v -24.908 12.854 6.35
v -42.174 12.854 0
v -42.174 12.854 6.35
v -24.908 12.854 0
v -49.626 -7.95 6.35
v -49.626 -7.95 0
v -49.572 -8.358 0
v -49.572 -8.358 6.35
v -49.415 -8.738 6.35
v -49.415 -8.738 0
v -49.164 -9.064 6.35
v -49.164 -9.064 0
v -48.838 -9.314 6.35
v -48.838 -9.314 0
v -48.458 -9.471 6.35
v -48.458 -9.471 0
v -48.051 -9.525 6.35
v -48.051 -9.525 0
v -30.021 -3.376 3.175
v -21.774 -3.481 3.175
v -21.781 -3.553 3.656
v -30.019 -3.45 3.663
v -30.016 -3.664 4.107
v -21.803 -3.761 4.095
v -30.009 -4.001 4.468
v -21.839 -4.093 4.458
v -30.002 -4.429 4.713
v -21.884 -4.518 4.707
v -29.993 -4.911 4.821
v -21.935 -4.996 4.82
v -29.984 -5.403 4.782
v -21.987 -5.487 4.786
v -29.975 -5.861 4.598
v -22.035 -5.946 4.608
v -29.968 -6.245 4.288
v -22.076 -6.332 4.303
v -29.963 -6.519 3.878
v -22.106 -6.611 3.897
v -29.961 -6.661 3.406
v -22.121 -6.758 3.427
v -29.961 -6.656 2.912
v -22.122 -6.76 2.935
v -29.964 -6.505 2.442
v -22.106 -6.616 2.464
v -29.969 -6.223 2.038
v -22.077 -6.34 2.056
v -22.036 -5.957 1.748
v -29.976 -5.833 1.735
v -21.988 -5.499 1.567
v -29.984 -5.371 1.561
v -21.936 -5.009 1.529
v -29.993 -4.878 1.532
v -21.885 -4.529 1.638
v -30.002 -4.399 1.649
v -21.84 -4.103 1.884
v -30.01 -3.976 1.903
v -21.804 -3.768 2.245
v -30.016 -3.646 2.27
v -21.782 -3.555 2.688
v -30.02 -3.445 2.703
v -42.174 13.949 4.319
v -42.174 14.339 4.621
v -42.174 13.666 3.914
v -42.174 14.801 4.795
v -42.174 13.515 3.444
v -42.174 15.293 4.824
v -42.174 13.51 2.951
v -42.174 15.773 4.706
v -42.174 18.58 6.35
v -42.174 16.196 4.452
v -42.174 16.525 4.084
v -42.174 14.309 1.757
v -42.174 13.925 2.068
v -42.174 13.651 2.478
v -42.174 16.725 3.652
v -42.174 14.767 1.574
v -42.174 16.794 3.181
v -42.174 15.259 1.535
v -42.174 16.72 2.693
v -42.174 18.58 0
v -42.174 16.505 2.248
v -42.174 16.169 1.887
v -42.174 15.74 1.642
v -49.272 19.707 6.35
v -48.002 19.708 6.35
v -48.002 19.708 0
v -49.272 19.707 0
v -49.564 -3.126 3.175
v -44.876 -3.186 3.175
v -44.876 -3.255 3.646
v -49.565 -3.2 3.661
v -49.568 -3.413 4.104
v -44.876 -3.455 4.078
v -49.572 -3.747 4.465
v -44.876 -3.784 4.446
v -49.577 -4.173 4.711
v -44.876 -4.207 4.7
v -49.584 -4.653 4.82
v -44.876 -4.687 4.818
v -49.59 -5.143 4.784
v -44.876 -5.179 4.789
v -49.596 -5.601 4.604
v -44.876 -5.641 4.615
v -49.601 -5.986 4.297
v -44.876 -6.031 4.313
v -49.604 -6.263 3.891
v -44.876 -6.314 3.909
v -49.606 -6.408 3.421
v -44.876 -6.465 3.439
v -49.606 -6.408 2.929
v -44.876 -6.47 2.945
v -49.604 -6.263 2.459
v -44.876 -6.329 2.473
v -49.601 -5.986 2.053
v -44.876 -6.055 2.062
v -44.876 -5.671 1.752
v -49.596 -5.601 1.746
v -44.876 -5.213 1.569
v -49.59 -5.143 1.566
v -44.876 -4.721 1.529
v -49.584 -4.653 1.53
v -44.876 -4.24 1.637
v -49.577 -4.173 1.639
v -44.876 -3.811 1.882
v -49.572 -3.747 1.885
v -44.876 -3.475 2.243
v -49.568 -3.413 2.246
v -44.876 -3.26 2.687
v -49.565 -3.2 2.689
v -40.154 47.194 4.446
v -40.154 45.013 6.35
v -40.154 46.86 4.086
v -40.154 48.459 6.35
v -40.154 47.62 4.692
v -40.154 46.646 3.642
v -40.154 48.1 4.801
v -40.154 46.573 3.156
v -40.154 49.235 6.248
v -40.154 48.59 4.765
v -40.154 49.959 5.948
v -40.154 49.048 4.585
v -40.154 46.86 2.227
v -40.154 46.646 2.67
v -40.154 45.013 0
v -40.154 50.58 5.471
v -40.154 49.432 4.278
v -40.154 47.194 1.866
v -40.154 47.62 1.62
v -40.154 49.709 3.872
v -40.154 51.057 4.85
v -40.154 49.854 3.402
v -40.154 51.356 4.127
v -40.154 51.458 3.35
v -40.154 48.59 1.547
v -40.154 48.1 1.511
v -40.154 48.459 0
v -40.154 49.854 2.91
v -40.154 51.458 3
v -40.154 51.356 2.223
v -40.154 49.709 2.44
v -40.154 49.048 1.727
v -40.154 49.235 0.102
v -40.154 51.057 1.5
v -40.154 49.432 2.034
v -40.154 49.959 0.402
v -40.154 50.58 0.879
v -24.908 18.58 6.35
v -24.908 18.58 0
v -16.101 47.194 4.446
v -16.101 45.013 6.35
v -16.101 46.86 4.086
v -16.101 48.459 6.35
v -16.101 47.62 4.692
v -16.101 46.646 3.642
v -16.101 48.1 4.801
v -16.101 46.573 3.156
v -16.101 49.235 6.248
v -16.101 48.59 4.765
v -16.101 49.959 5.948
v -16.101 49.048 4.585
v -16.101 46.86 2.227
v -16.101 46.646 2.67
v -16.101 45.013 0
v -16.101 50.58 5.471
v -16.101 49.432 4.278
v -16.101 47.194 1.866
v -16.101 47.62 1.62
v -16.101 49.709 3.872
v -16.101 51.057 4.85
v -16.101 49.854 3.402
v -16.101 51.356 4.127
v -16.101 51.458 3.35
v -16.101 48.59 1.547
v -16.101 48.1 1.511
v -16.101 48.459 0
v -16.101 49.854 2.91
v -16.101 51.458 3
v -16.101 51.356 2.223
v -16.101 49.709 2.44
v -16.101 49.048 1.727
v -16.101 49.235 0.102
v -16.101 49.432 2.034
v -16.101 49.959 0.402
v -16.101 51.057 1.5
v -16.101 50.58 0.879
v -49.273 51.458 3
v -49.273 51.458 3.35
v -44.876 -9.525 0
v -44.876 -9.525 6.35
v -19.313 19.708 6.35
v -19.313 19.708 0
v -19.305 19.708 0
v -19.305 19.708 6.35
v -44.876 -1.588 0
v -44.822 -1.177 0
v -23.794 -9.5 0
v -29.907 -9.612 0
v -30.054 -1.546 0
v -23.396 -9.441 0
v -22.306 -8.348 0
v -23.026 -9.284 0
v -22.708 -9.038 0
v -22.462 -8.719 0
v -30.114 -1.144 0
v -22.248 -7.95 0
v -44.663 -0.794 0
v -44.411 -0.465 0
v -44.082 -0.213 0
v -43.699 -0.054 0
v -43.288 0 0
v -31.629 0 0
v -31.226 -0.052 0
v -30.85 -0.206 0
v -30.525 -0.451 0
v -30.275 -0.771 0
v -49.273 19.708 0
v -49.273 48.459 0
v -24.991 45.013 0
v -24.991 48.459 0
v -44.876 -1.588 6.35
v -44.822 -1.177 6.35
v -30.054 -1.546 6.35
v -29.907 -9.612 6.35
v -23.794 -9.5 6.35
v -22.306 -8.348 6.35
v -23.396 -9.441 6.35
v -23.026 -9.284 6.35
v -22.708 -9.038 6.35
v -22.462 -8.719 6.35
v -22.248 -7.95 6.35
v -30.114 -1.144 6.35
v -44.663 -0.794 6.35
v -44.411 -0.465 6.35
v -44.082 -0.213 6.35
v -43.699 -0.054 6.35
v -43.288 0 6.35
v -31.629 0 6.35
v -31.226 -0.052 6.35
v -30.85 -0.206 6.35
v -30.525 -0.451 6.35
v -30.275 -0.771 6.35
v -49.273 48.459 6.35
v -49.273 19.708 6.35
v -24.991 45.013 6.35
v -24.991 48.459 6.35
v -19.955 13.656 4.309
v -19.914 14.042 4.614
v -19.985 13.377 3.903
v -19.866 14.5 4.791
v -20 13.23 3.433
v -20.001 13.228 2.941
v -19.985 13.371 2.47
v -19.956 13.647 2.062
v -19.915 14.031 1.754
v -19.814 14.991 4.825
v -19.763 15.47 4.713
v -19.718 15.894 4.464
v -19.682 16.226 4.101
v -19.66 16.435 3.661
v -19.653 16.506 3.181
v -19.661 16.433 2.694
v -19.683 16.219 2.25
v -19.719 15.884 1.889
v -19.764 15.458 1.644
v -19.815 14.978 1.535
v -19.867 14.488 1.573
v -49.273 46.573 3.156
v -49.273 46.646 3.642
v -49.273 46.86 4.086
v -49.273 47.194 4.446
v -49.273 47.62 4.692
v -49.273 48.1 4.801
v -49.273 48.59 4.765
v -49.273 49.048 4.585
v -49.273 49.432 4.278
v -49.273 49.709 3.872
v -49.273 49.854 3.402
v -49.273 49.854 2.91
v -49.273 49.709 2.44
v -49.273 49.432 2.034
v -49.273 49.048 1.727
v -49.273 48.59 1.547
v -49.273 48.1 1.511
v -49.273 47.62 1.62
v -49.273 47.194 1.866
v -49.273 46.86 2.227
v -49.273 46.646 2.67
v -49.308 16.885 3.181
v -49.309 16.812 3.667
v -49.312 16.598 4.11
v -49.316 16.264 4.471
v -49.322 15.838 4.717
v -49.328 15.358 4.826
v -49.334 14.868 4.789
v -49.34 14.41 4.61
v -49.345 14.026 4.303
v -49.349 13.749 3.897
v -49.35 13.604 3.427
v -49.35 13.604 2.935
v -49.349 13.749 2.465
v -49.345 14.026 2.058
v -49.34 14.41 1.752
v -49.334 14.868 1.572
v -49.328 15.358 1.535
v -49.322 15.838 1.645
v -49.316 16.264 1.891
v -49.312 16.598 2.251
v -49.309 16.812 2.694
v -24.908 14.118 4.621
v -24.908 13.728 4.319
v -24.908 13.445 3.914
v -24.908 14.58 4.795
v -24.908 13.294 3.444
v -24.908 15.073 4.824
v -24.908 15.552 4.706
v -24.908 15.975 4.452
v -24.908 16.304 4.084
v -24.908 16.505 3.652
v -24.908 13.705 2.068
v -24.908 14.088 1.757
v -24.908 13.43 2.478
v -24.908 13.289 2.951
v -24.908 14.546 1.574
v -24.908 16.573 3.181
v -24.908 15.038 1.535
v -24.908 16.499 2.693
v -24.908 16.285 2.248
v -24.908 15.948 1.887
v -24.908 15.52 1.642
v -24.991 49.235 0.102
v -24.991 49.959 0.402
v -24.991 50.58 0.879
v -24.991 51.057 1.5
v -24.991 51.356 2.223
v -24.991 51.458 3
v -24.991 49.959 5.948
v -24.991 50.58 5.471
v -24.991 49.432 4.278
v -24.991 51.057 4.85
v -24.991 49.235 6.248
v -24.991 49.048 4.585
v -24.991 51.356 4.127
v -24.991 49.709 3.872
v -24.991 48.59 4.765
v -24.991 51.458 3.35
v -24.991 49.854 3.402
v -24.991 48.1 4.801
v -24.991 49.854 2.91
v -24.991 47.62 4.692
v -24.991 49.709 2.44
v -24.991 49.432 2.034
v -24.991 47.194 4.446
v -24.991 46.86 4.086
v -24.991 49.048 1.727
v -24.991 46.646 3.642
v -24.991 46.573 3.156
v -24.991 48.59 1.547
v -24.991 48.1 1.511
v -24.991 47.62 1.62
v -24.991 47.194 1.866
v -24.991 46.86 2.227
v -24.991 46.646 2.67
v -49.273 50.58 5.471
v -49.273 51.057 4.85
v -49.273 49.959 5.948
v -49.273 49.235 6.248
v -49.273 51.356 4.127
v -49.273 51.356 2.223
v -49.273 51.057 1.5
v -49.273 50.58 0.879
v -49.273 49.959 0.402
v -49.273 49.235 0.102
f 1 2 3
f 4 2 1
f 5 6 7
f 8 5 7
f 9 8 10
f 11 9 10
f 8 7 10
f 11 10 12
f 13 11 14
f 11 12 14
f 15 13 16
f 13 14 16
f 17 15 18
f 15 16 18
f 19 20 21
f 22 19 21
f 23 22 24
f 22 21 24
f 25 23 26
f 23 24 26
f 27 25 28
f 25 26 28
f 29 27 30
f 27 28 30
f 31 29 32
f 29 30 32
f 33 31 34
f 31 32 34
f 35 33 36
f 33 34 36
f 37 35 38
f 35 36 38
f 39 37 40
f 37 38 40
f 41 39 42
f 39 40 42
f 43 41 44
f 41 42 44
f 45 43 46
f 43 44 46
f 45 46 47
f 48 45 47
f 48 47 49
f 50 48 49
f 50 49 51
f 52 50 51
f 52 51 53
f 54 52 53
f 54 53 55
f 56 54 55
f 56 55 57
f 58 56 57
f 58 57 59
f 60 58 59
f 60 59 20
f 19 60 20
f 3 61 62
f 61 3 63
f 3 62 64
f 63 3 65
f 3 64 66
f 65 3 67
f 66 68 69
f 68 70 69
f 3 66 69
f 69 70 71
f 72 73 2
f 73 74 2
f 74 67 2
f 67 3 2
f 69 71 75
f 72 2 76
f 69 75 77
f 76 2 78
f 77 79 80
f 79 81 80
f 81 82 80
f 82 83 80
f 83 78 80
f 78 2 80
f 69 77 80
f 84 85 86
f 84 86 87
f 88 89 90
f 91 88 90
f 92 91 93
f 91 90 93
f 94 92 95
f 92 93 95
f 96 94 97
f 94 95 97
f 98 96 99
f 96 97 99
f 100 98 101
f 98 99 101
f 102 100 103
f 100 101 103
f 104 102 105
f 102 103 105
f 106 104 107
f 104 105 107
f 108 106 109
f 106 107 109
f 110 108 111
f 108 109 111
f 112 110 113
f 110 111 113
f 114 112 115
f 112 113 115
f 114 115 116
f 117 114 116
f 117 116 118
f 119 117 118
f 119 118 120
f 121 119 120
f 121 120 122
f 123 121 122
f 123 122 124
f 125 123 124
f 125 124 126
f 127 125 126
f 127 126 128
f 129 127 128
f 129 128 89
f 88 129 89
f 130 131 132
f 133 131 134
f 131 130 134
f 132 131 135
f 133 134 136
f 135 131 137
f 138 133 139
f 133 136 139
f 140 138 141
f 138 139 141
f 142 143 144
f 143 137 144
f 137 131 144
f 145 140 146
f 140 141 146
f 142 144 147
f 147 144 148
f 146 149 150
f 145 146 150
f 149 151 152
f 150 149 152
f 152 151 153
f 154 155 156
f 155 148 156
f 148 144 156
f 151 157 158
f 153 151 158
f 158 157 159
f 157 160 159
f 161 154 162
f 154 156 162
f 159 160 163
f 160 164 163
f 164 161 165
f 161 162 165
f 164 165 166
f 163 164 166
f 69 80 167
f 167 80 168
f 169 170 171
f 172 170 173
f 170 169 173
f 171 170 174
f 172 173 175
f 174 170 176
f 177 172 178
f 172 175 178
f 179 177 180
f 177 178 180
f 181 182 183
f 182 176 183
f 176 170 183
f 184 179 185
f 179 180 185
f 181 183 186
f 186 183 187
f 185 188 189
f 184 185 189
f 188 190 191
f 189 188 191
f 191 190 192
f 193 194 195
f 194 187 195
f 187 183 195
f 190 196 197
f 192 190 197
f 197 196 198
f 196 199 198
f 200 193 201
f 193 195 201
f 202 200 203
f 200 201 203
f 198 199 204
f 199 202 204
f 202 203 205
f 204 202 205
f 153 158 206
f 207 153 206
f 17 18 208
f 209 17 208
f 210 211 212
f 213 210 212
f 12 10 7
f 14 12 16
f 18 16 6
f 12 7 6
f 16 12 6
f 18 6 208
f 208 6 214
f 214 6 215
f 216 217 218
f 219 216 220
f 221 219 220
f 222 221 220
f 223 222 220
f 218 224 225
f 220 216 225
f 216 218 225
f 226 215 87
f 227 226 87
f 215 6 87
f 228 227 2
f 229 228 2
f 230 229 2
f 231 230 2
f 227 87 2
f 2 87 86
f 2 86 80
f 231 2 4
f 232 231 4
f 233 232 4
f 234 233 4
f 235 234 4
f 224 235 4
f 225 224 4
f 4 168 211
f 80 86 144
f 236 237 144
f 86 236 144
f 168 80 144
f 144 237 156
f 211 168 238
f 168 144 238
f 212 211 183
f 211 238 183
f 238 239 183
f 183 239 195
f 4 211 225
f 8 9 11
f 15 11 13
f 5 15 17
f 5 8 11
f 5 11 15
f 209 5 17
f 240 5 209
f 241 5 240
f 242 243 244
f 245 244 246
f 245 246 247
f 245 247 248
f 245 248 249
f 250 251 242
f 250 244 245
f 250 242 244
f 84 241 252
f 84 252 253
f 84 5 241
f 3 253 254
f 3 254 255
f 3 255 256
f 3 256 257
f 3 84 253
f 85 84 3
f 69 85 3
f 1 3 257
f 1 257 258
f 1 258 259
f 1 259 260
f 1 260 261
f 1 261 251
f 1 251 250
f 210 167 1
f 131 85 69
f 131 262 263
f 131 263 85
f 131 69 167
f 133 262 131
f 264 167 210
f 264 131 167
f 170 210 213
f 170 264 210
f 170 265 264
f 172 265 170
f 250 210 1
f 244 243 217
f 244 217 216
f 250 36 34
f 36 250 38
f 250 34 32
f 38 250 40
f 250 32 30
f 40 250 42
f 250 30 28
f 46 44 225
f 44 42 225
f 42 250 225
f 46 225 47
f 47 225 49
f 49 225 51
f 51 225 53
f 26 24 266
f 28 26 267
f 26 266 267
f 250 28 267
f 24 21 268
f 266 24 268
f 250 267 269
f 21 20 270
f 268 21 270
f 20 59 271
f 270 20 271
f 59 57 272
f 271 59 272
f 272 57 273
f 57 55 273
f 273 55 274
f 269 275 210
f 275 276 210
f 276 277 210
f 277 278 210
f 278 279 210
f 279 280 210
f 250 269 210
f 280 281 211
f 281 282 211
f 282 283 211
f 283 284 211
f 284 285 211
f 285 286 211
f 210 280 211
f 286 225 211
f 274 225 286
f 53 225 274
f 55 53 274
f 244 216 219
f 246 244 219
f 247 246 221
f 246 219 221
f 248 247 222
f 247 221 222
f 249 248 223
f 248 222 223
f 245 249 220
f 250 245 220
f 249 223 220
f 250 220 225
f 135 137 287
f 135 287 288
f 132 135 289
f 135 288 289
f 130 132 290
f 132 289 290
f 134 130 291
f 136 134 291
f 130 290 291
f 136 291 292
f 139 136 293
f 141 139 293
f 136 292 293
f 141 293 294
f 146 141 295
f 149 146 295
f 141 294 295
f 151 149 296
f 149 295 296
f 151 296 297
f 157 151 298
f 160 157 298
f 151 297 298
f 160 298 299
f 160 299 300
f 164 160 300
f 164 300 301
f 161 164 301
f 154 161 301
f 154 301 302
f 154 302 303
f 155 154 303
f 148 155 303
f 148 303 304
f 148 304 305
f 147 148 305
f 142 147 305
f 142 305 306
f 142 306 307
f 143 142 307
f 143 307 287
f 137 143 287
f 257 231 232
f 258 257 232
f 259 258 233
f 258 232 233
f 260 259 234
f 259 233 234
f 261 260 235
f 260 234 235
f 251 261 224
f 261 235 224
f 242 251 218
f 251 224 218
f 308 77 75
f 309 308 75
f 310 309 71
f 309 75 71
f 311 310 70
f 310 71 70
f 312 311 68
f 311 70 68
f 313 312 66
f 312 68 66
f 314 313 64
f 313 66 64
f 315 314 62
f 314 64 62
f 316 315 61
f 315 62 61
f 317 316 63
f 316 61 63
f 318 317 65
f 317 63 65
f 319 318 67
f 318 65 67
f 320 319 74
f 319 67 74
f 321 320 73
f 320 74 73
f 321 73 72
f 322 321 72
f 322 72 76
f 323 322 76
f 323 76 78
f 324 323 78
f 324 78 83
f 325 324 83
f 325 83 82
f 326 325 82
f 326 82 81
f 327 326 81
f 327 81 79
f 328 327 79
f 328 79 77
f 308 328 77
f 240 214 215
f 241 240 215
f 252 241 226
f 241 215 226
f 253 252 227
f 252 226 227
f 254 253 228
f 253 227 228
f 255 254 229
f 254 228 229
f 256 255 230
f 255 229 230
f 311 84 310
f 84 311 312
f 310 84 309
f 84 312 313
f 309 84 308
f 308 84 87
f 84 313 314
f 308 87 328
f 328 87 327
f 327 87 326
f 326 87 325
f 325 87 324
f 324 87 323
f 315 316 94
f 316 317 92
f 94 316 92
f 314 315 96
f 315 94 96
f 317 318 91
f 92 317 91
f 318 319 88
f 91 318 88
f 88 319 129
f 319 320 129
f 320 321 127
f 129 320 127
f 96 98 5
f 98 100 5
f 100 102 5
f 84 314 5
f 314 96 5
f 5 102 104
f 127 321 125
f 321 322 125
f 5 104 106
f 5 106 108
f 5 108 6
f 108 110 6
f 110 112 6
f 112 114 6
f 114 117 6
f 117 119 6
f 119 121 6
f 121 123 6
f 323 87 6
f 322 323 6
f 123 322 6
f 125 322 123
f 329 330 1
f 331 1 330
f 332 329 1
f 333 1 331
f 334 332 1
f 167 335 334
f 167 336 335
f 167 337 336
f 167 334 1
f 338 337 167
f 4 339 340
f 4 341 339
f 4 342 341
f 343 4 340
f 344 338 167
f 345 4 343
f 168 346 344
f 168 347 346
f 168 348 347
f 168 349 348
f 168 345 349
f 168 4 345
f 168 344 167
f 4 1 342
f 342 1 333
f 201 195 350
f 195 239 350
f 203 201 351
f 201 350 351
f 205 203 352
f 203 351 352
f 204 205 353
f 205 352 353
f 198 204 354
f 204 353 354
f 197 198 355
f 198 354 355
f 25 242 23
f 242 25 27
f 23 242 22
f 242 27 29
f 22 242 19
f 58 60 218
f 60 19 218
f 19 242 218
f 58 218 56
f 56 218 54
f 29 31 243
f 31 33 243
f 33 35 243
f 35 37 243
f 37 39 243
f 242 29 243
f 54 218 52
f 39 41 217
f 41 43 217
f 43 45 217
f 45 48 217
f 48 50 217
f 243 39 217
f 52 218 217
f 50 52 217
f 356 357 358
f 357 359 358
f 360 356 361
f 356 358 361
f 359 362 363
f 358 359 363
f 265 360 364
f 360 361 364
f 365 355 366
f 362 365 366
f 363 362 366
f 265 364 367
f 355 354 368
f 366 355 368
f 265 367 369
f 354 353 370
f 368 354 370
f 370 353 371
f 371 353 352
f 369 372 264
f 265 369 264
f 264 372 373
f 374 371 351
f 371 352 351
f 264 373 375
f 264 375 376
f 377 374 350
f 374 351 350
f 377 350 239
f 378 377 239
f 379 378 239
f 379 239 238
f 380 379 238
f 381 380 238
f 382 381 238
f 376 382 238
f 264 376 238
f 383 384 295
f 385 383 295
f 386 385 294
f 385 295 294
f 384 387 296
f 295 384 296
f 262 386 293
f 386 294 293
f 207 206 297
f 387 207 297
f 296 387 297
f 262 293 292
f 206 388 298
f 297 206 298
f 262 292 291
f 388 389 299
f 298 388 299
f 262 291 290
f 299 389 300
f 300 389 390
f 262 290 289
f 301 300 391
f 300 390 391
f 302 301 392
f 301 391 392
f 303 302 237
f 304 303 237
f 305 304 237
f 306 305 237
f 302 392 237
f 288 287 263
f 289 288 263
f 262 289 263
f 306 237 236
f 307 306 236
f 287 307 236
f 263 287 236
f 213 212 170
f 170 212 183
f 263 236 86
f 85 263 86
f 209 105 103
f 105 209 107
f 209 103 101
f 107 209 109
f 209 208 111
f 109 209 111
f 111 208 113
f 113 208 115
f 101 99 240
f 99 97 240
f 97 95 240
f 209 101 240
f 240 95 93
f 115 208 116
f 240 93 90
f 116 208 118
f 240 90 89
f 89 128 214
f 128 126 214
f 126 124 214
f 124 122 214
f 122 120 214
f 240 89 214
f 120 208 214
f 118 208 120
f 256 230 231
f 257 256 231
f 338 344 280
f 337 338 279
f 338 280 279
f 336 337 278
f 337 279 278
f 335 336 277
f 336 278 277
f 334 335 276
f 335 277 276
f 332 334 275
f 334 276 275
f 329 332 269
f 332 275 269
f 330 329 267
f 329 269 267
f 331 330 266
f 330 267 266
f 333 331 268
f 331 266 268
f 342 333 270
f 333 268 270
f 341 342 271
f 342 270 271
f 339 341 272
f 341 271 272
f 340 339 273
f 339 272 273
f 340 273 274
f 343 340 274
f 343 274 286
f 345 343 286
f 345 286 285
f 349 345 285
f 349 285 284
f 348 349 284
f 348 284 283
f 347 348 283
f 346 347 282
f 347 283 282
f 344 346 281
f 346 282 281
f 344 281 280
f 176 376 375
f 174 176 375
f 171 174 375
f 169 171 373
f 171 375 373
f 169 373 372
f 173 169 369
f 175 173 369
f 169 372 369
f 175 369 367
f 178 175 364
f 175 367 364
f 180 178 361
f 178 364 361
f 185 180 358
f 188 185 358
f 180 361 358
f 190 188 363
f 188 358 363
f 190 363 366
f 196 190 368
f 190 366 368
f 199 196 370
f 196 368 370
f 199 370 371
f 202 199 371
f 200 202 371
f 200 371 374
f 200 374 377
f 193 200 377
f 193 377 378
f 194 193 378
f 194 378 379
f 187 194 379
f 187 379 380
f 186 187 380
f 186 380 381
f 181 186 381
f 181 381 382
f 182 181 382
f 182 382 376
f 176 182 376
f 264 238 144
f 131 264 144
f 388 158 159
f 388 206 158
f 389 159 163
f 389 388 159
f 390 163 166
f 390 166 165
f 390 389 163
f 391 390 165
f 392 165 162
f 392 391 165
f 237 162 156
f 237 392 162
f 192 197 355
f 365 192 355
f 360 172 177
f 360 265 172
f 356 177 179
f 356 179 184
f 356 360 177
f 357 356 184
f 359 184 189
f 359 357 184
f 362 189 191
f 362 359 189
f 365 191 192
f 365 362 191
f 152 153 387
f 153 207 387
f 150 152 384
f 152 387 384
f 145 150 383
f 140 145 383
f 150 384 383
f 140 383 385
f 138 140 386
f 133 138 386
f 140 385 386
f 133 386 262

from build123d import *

# Parameters (mm, degrees)
F1_DEPTH = 6.35
F3_D     = 3.3
F4_R     = 2.99974
F5_W     = 17.2659438103
F5_H     = 5.7261204347
F6_DEPTH = 6.35
F8_D     = 3.3
F10_D    = 3.3


with BuildPart() as f1:
    # F0 (on Top) → F1 (new body)
    with BuildSketch(Plane.XY):
        Polygon((-40.1544658885, 51.4584925147), (-49.2730658885, 51.4584925147), (-49.2730658885, 19.7084925147), (-19.3046238273, 19.7084925147), (-16.1006658885, 45.0133569539), (-16.1006658885, 51.4584925147), (-24.9906658885, 51.4584925147), (-24.9906658885, 45.0133569539), (-40.1544658885, 45.0133569539), align=None)
    extrude(amount=F1_DEPTH)

    # F3 (through all)
    with Locations(Plane.YZ.offset(-16.1006658885)):
        with Locations((48.2228761828, 3.1560653739)):
            Hole(F3_D / 2)

    # F4
    f4_edges = [f1.edges().sort_by_distance(p)[0] for p in [
        (-20.545666, 51.458493, 0),
        (-20.545666, 51.458493, 6.35),
        (-44.713766, 51.458493, 0),
        (-44.713766, 51.458493, 6.35),
    ]]
    fillet(f4_edges, radius=F4_R)

    # F5 (on Top) → F6 (join)
    with BuildSketch(Plane.XY):
        with BuildLine():
            Line((-48.0508575901, -9.525), (-44.8758575901, -9.525))
            Line((-44.8758575901, -9.525), (-44.8758575901, -1.5875))
            ThreePointArc((-44.8758575901, -1.5875), (-44.4108896053, -0.4649679849), (-43.2883575901, 0))
            Line((-43.2883575901, 0), (-31.6287431982, 0))
            ThreePointArc((-31.6287431982, 0), (-30.5254053426, -0.4511271755), (-30.0542057782, -1.54604321))
            Line((-30.0542057782, -1.54604321), (-29.9068968743, -9.6117341891))
            Line((-29.9068968743, -9.6117341891), (-23.7938760812, -9.5000881572))
            ThreePointArc((-23.7938760812, -9.5000881572), (-22.7076296204, -9.03764911), (-22.248025792, -7.9502))
            Line((-22.248025792, -7.9502), (-19.3092767149, 19.7430392682))
            Line((-19.3092767149, 19.7430392682), (-49.2723993957, 19.7069626302))
            Line((-49.2723993957, 19.7069626302), (-49.6256575901, -7.9502))
            ThreePointArc((-49.6256575901, -7.9502), (-49.1644093491, -9.063751759), (-48.0508575901, -9.525))
        make_face()
        with Locations((-33.5407005623, 15.7169797458)):
            Rectangle(F5_W, F5_H, mode=Mode.SUBTRACT)
    extrude(amount=F6_DEPTH)

    # F8 (through all)
    with Locations(Plane(origin=(-49.516033415, 0.6324562209, 0), x_dir=(-0.0127717144, -0.9999184383, 0), z_dir=(-0.9999184383, 0.0127717144, 0))):
        with Locations((5.4090460762, 3.175)):
            Hole(F8_D / 2)

    # F10 (through all)
    with Locations(Plane(origin=(-49.516033415, 0.6324562209, 0), x_dir=(-0.0127717144, -0.9999184383, 0), z_dir=(-0.9999184383, 0.0127717144, 0))):
        with Locations((-14.6038243547, 3.1806000043)):
            Hole(F10_D / 2)


solid = f1.part
